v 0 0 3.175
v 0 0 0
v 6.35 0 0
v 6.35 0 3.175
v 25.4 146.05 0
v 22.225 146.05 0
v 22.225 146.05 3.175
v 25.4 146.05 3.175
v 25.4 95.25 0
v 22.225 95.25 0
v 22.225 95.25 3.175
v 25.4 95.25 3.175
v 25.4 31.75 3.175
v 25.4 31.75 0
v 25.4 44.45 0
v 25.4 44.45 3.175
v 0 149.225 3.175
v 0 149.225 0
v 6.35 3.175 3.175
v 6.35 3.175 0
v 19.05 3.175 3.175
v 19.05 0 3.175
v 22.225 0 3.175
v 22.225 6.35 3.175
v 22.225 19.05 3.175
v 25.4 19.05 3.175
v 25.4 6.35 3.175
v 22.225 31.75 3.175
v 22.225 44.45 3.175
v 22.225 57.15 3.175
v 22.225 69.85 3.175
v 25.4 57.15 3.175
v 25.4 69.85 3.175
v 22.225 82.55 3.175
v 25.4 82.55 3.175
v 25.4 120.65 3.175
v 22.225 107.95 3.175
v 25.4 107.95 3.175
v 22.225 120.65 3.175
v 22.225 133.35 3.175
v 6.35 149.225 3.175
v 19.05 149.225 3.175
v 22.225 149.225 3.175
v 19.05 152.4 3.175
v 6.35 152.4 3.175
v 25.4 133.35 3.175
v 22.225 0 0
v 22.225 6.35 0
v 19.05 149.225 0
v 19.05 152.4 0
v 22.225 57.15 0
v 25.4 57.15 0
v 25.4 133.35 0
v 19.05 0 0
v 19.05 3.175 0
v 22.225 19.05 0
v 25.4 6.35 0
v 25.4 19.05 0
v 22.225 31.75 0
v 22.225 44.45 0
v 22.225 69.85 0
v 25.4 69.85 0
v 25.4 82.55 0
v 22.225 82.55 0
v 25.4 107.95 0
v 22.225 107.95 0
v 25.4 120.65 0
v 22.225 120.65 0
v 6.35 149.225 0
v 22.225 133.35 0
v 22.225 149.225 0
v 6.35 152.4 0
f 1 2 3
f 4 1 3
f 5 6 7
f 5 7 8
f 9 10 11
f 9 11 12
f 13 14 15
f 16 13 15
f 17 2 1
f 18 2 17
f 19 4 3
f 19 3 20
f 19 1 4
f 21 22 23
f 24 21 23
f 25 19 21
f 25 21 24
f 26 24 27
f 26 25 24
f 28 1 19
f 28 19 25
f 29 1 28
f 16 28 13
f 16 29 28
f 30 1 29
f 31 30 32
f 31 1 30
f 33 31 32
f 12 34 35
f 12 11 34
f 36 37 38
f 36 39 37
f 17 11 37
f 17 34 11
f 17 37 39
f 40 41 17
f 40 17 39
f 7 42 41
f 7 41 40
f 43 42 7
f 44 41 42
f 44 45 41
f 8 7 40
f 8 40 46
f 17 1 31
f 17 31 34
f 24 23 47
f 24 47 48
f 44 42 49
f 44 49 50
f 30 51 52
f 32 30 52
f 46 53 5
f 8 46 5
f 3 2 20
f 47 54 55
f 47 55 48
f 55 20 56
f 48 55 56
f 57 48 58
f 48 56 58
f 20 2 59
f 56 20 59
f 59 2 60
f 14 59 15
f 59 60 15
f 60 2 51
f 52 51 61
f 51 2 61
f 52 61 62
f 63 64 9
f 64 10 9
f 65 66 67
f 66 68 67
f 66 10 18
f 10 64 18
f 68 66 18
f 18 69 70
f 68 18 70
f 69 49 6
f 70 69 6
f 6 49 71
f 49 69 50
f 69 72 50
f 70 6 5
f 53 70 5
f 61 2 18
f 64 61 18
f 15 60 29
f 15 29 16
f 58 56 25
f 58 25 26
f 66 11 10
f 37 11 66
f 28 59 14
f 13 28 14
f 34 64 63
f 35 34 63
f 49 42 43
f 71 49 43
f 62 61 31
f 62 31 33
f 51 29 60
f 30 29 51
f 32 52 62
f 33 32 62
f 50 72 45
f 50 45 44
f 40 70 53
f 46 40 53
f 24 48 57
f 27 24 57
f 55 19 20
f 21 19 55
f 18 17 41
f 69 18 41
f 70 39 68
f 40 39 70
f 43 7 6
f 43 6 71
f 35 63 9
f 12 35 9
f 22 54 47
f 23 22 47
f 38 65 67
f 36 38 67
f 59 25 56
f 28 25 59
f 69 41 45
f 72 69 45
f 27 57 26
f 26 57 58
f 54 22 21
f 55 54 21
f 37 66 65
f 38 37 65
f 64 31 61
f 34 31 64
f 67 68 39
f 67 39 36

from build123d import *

# Parameters (mm, degrees)
SKETCH1_W          = 25.4
SKETCH1_H          = 152.4
EXTRUDE1_DEPTH     = 3.175
SKETCH3_W          = 3.175
SKETCH3_H          = 6.35
CUT_EXTRUDE1_DEPTH = 3.175
LPATTERN1_COUNT    = 2
LPATTERN1_PITCH    = 146.05
SKETCH4_W          = 3.175
SKETCH4_H          = 12.7
CUT_EXTRUDE2_DEPTH = 3.175
LPATTERN2_COUNT    = 5
LPATTERN2_PITCH    = 25.4
SKETCH5_W          = 12.7
SKETCH5_H          = 3.175
CUT_EXTRUDE3_DEPTH = 3.175
SKETCH6_W          = 6.35
SKETCH6_H          = 3.175
CUT_EXTRUDE4_DEPTH = 3.175
LPATTERN3_COUNT    = 2
LPATTERN3_PITCH    = 19.05


with BuildPart() as part:
    # Sketch1 → Extrude1 (new body)
    with BuildSketch(Plane.XY):
        with Locations((12.7, 76.2)):
            Rectangle(SKETCH1_W, SKETCH1_H)
    extrude(amount=EXTRUDE1_DEPTH)

    # Sketch3 → Cut-Extrude1 (cut)
    with BuildSketch(Plane.XY.offset(3.175)):
        with Locations((23.8125, 149.225)):
            Rectangle(SKETCH3_W, SKETCH3_H)
    cut_extrude1 = extrude(amount=-CUT_EXTRUDE1_DEPTH, mode=Mode.SUBTRACT)

    # LPattern1: Cut-Extrude1 ×2
    with Locations(*[(0, -i * LPATTERN1_PITCH, 0) for i in range(1, LPATTERN1_COUNT)]):
        add(cut_extrude1, mode=Mode.SUBTRACT)

    # Sketch4 → Cut-Extrude2 (cut)
    with BuildSketch(Plane.XY.offset(3.175)):
        with Locations((23.8125, 127)):
            Rectangle(SKETCH4_W, SKETCH4_H)
    cut_extrude2 = extrude(amount=-CUT_EXTRUDE2_DEPTH, mode=Mode.SUBTRACT)

    # LPattern2: Cut-Extrude2 ×5
    with Locations(*[(0, -i * LPATTERN2_PITCH, 0) for i in range(1, LPATTERN2_COUNT)]):
        add(cut_extrude2, mode=Mode.SUBTRACT)

    # Sketch5 → Cut-Extrude3 (cut)
    with BuildSketch(Plane.XY.offset(3.175)):
        with Locations((12.7, 1.5875)):
            Rectangle(SKETCH5_W, SKETCH5_H)
    extrude(amount=-CUT_EXTRUDE3_DEPTH, mode=Mode.SUBTRACT)

    # Sketch6 → Cut-Extrude4 (cut)
    with BuildSketch(Plane.XY.offset(3.175)):
        with Locations((3.175, 150.8125)):
            Rectangle(SKETCH6_W, SKETCH6_H)
    cut_extrude4 = extrude(amount=-CUT_EXTRUDE4_DEPTH, mode=Mode.SUBTRACT)

    # LPattern3: Cut-Extrude4 ×2
    with Locations(*[(i * LPATTERN3_PITCH, 0, 0) for i in range(1, LPATTERN3_COUNT)]):
        add(cut_extrude4, mode=Mode.SUBTRACT)


solid = part.part
